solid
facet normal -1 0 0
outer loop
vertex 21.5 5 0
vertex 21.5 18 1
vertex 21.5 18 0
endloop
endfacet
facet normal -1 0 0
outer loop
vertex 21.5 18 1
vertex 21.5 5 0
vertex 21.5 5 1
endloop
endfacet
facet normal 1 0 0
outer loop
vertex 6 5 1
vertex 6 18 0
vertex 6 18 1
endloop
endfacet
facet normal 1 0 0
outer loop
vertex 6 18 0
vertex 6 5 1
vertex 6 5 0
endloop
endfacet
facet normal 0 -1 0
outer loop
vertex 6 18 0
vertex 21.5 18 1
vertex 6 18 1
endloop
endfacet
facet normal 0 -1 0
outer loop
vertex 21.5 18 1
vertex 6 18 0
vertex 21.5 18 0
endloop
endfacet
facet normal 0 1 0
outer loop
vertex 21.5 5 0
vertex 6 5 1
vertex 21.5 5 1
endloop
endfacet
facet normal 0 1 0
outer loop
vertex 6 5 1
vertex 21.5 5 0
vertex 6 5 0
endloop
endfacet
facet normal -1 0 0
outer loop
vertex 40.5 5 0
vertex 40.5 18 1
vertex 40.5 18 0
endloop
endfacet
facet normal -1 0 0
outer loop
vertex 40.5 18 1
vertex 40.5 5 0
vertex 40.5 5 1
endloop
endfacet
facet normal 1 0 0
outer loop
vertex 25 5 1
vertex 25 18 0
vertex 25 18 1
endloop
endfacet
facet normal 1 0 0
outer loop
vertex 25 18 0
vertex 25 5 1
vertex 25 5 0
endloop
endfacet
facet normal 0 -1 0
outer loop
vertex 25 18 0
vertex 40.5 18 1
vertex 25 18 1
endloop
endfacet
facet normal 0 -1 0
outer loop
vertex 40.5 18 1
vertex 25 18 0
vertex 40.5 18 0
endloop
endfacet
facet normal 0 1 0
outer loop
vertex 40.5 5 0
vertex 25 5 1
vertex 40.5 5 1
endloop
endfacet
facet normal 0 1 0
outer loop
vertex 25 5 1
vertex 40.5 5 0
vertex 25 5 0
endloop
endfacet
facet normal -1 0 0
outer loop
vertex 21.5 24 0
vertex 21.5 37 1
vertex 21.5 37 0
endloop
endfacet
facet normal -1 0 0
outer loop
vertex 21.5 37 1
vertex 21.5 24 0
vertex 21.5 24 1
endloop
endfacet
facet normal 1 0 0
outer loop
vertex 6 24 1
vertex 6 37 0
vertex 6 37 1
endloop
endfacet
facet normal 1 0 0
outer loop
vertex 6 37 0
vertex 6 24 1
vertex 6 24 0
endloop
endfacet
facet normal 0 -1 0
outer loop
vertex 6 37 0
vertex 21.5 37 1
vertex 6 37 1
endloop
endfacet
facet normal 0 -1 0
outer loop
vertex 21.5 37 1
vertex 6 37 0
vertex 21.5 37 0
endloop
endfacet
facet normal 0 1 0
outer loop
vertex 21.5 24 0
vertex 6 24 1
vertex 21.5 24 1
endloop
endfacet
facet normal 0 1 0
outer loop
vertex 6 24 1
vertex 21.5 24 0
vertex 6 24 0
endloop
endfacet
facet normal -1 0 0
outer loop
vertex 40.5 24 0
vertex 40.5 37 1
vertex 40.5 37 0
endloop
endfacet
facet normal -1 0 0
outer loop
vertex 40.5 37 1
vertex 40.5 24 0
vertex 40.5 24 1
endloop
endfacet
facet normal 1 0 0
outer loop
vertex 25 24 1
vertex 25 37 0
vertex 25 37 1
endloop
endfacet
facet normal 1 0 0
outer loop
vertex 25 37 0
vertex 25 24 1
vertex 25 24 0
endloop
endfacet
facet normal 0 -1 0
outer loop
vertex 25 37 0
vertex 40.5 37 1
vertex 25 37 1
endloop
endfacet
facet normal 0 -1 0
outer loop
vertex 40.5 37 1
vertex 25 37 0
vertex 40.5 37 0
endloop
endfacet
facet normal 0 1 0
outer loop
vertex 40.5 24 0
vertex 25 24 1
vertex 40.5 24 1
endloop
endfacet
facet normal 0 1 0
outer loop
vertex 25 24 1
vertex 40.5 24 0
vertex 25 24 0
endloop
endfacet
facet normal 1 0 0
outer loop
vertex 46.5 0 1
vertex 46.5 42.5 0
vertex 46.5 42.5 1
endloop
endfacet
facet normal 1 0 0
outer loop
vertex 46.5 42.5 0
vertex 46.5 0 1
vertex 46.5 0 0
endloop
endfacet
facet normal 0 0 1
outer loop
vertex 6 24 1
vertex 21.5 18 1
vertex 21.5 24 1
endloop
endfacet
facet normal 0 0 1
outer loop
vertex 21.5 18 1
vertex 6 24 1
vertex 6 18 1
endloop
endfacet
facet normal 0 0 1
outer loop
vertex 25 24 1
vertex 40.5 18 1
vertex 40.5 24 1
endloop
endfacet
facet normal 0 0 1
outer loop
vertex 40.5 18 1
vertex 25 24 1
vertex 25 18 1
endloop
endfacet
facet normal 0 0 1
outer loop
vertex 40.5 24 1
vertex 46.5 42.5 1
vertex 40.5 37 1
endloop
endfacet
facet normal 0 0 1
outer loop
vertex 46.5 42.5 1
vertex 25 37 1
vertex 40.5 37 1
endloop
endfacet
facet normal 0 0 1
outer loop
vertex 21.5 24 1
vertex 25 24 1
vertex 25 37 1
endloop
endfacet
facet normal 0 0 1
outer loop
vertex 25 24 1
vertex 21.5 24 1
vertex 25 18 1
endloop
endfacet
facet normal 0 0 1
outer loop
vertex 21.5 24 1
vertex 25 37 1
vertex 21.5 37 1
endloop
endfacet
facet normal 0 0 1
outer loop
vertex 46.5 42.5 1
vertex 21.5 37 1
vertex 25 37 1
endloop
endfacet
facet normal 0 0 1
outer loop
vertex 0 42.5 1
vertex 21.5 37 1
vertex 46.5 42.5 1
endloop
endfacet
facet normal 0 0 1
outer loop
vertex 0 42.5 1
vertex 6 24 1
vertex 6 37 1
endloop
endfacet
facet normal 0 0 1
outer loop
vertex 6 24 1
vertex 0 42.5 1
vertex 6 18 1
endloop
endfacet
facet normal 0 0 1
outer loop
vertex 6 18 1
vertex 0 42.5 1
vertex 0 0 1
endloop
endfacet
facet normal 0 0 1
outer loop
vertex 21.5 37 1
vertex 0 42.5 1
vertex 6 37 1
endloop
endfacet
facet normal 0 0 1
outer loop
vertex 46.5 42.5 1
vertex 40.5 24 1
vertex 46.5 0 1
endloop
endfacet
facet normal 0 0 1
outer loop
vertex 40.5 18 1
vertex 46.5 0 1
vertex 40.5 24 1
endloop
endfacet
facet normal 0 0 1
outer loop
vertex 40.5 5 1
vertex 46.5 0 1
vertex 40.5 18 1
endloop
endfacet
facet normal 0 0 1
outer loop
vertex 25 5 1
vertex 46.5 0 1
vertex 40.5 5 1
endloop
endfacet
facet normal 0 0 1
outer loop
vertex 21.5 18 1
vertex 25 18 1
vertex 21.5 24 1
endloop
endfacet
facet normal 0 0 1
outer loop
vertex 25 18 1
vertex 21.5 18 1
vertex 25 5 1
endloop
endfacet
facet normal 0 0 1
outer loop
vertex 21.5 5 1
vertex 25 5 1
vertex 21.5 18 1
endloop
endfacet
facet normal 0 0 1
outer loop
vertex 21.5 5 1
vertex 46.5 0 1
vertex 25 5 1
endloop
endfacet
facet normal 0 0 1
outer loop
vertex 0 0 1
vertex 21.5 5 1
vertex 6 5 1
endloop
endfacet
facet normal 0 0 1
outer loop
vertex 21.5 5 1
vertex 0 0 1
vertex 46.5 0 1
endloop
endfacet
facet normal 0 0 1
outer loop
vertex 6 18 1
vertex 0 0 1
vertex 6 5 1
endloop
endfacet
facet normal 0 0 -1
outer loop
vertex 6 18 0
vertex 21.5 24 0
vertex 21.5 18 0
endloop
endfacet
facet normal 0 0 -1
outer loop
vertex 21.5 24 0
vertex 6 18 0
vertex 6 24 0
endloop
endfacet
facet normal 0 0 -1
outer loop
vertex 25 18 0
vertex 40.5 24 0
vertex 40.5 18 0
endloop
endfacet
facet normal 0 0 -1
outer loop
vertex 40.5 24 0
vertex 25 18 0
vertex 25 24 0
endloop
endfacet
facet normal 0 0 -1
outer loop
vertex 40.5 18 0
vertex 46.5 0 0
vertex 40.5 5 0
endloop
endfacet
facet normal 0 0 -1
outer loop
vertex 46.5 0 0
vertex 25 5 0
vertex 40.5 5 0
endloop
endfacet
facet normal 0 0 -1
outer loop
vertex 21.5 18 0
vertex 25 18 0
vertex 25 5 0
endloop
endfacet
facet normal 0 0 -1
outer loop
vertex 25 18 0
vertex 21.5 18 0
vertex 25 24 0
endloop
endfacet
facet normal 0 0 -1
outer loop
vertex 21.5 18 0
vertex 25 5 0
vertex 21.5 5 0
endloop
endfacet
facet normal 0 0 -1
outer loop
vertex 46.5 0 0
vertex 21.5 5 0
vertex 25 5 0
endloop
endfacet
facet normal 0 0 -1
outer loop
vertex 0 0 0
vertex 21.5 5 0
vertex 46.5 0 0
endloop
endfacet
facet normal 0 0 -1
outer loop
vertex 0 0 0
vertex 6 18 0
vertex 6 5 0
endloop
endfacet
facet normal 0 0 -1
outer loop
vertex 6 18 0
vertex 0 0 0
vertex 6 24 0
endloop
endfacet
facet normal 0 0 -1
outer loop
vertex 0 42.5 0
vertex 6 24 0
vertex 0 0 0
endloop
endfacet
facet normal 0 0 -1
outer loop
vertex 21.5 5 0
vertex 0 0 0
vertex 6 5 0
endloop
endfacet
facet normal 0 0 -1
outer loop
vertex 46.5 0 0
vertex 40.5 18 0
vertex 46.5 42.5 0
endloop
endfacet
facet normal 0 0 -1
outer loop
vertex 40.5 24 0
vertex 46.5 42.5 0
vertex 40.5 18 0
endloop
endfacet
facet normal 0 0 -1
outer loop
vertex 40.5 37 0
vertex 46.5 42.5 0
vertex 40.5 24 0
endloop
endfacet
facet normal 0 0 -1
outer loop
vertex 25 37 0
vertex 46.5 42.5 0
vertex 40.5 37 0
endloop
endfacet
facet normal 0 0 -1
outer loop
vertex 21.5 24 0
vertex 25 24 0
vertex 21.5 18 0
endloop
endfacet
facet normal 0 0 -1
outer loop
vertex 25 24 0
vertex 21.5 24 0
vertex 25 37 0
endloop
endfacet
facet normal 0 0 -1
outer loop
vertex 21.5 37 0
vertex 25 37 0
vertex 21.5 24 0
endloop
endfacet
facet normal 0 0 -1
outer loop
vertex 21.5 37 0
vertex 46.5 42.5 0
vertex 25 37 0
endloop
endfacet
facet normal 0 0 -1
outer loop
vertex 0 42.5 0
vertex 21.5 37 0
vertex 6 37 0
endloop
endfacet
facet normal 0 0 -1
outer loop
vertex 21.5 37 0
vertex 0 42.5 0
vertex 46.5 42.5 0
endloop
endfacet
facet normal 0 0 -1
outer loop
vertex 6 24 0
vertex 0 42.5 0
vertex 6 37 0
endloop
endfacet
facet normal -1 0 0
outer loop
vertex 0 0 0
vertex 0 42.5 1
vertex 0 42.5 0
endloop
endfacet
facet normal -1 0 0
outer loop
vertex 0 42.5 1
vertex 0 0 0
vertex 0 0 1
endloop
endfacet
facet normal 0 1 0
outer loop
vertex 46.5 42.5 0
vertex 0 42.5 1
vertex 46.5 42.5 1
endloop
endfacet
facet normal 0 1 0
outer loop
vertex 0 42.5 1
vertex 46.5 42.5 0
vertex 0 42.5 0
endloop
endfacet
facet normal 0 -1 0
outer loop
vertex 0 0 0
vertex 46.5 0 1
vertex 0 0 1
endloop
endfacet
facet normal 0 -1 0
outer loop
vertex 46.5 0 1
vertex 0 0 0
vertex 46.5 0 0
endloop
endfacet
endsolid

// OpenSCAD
/* KeySizeTest
 * Make a small 2x2 matrix to test keyholes.
 */
keyCols = 2;
keyRows = 2;
keyX = 15.5;
keyY = 13;
keySpace = 3.5;
vKeySpace=6;
edgeSpaceAddition = 4;
edgeSpace = (edgeSpaceAddition*2)-keySpace;
keyZ = -1;

moduleX = (edgeSpace+edgeSpaceAddition)+(keySpace*keyCols)+keyX*(keyCols-1)+keyX;
moduleY = (edgeSpaceAddition*2-keySpace)+(vKeySpace*keyRows)+keyY*(keyRows-1)+keyY;
moduleZ = 1;

keySize = [keyX, keyY, moduleZ+2];

function position(x,y,z) = [edgeSpace+keySpace*x+keyX*(x-1)-(edgeSpaceAddition/2), edgeSpace-keySpace+(vKeySpace)*y+keyY*(y-1)-(edgeSpaceAddition/2), z];

module keyHoles (yStart, yEnd, xStart, xEnd){
  for(y = [yStart:yEnd]){
    for(x = [xStart:xEnd]){
      translate(position(x,y,keyZ)) cube(keySize);
    }
  }
}

module beam (bStart, bEnd){
  for (b = [bStart:bEnd]){  
    translate([edgeSpace,b*22-2,0]){  
      cube([moduleX-(edgeSpace*2),2,2]);
    }
  }
}


difference(){

  cube([moduleX,moduleY,moduleZ]);
  keyHoles(1,2,1,2);
  }
